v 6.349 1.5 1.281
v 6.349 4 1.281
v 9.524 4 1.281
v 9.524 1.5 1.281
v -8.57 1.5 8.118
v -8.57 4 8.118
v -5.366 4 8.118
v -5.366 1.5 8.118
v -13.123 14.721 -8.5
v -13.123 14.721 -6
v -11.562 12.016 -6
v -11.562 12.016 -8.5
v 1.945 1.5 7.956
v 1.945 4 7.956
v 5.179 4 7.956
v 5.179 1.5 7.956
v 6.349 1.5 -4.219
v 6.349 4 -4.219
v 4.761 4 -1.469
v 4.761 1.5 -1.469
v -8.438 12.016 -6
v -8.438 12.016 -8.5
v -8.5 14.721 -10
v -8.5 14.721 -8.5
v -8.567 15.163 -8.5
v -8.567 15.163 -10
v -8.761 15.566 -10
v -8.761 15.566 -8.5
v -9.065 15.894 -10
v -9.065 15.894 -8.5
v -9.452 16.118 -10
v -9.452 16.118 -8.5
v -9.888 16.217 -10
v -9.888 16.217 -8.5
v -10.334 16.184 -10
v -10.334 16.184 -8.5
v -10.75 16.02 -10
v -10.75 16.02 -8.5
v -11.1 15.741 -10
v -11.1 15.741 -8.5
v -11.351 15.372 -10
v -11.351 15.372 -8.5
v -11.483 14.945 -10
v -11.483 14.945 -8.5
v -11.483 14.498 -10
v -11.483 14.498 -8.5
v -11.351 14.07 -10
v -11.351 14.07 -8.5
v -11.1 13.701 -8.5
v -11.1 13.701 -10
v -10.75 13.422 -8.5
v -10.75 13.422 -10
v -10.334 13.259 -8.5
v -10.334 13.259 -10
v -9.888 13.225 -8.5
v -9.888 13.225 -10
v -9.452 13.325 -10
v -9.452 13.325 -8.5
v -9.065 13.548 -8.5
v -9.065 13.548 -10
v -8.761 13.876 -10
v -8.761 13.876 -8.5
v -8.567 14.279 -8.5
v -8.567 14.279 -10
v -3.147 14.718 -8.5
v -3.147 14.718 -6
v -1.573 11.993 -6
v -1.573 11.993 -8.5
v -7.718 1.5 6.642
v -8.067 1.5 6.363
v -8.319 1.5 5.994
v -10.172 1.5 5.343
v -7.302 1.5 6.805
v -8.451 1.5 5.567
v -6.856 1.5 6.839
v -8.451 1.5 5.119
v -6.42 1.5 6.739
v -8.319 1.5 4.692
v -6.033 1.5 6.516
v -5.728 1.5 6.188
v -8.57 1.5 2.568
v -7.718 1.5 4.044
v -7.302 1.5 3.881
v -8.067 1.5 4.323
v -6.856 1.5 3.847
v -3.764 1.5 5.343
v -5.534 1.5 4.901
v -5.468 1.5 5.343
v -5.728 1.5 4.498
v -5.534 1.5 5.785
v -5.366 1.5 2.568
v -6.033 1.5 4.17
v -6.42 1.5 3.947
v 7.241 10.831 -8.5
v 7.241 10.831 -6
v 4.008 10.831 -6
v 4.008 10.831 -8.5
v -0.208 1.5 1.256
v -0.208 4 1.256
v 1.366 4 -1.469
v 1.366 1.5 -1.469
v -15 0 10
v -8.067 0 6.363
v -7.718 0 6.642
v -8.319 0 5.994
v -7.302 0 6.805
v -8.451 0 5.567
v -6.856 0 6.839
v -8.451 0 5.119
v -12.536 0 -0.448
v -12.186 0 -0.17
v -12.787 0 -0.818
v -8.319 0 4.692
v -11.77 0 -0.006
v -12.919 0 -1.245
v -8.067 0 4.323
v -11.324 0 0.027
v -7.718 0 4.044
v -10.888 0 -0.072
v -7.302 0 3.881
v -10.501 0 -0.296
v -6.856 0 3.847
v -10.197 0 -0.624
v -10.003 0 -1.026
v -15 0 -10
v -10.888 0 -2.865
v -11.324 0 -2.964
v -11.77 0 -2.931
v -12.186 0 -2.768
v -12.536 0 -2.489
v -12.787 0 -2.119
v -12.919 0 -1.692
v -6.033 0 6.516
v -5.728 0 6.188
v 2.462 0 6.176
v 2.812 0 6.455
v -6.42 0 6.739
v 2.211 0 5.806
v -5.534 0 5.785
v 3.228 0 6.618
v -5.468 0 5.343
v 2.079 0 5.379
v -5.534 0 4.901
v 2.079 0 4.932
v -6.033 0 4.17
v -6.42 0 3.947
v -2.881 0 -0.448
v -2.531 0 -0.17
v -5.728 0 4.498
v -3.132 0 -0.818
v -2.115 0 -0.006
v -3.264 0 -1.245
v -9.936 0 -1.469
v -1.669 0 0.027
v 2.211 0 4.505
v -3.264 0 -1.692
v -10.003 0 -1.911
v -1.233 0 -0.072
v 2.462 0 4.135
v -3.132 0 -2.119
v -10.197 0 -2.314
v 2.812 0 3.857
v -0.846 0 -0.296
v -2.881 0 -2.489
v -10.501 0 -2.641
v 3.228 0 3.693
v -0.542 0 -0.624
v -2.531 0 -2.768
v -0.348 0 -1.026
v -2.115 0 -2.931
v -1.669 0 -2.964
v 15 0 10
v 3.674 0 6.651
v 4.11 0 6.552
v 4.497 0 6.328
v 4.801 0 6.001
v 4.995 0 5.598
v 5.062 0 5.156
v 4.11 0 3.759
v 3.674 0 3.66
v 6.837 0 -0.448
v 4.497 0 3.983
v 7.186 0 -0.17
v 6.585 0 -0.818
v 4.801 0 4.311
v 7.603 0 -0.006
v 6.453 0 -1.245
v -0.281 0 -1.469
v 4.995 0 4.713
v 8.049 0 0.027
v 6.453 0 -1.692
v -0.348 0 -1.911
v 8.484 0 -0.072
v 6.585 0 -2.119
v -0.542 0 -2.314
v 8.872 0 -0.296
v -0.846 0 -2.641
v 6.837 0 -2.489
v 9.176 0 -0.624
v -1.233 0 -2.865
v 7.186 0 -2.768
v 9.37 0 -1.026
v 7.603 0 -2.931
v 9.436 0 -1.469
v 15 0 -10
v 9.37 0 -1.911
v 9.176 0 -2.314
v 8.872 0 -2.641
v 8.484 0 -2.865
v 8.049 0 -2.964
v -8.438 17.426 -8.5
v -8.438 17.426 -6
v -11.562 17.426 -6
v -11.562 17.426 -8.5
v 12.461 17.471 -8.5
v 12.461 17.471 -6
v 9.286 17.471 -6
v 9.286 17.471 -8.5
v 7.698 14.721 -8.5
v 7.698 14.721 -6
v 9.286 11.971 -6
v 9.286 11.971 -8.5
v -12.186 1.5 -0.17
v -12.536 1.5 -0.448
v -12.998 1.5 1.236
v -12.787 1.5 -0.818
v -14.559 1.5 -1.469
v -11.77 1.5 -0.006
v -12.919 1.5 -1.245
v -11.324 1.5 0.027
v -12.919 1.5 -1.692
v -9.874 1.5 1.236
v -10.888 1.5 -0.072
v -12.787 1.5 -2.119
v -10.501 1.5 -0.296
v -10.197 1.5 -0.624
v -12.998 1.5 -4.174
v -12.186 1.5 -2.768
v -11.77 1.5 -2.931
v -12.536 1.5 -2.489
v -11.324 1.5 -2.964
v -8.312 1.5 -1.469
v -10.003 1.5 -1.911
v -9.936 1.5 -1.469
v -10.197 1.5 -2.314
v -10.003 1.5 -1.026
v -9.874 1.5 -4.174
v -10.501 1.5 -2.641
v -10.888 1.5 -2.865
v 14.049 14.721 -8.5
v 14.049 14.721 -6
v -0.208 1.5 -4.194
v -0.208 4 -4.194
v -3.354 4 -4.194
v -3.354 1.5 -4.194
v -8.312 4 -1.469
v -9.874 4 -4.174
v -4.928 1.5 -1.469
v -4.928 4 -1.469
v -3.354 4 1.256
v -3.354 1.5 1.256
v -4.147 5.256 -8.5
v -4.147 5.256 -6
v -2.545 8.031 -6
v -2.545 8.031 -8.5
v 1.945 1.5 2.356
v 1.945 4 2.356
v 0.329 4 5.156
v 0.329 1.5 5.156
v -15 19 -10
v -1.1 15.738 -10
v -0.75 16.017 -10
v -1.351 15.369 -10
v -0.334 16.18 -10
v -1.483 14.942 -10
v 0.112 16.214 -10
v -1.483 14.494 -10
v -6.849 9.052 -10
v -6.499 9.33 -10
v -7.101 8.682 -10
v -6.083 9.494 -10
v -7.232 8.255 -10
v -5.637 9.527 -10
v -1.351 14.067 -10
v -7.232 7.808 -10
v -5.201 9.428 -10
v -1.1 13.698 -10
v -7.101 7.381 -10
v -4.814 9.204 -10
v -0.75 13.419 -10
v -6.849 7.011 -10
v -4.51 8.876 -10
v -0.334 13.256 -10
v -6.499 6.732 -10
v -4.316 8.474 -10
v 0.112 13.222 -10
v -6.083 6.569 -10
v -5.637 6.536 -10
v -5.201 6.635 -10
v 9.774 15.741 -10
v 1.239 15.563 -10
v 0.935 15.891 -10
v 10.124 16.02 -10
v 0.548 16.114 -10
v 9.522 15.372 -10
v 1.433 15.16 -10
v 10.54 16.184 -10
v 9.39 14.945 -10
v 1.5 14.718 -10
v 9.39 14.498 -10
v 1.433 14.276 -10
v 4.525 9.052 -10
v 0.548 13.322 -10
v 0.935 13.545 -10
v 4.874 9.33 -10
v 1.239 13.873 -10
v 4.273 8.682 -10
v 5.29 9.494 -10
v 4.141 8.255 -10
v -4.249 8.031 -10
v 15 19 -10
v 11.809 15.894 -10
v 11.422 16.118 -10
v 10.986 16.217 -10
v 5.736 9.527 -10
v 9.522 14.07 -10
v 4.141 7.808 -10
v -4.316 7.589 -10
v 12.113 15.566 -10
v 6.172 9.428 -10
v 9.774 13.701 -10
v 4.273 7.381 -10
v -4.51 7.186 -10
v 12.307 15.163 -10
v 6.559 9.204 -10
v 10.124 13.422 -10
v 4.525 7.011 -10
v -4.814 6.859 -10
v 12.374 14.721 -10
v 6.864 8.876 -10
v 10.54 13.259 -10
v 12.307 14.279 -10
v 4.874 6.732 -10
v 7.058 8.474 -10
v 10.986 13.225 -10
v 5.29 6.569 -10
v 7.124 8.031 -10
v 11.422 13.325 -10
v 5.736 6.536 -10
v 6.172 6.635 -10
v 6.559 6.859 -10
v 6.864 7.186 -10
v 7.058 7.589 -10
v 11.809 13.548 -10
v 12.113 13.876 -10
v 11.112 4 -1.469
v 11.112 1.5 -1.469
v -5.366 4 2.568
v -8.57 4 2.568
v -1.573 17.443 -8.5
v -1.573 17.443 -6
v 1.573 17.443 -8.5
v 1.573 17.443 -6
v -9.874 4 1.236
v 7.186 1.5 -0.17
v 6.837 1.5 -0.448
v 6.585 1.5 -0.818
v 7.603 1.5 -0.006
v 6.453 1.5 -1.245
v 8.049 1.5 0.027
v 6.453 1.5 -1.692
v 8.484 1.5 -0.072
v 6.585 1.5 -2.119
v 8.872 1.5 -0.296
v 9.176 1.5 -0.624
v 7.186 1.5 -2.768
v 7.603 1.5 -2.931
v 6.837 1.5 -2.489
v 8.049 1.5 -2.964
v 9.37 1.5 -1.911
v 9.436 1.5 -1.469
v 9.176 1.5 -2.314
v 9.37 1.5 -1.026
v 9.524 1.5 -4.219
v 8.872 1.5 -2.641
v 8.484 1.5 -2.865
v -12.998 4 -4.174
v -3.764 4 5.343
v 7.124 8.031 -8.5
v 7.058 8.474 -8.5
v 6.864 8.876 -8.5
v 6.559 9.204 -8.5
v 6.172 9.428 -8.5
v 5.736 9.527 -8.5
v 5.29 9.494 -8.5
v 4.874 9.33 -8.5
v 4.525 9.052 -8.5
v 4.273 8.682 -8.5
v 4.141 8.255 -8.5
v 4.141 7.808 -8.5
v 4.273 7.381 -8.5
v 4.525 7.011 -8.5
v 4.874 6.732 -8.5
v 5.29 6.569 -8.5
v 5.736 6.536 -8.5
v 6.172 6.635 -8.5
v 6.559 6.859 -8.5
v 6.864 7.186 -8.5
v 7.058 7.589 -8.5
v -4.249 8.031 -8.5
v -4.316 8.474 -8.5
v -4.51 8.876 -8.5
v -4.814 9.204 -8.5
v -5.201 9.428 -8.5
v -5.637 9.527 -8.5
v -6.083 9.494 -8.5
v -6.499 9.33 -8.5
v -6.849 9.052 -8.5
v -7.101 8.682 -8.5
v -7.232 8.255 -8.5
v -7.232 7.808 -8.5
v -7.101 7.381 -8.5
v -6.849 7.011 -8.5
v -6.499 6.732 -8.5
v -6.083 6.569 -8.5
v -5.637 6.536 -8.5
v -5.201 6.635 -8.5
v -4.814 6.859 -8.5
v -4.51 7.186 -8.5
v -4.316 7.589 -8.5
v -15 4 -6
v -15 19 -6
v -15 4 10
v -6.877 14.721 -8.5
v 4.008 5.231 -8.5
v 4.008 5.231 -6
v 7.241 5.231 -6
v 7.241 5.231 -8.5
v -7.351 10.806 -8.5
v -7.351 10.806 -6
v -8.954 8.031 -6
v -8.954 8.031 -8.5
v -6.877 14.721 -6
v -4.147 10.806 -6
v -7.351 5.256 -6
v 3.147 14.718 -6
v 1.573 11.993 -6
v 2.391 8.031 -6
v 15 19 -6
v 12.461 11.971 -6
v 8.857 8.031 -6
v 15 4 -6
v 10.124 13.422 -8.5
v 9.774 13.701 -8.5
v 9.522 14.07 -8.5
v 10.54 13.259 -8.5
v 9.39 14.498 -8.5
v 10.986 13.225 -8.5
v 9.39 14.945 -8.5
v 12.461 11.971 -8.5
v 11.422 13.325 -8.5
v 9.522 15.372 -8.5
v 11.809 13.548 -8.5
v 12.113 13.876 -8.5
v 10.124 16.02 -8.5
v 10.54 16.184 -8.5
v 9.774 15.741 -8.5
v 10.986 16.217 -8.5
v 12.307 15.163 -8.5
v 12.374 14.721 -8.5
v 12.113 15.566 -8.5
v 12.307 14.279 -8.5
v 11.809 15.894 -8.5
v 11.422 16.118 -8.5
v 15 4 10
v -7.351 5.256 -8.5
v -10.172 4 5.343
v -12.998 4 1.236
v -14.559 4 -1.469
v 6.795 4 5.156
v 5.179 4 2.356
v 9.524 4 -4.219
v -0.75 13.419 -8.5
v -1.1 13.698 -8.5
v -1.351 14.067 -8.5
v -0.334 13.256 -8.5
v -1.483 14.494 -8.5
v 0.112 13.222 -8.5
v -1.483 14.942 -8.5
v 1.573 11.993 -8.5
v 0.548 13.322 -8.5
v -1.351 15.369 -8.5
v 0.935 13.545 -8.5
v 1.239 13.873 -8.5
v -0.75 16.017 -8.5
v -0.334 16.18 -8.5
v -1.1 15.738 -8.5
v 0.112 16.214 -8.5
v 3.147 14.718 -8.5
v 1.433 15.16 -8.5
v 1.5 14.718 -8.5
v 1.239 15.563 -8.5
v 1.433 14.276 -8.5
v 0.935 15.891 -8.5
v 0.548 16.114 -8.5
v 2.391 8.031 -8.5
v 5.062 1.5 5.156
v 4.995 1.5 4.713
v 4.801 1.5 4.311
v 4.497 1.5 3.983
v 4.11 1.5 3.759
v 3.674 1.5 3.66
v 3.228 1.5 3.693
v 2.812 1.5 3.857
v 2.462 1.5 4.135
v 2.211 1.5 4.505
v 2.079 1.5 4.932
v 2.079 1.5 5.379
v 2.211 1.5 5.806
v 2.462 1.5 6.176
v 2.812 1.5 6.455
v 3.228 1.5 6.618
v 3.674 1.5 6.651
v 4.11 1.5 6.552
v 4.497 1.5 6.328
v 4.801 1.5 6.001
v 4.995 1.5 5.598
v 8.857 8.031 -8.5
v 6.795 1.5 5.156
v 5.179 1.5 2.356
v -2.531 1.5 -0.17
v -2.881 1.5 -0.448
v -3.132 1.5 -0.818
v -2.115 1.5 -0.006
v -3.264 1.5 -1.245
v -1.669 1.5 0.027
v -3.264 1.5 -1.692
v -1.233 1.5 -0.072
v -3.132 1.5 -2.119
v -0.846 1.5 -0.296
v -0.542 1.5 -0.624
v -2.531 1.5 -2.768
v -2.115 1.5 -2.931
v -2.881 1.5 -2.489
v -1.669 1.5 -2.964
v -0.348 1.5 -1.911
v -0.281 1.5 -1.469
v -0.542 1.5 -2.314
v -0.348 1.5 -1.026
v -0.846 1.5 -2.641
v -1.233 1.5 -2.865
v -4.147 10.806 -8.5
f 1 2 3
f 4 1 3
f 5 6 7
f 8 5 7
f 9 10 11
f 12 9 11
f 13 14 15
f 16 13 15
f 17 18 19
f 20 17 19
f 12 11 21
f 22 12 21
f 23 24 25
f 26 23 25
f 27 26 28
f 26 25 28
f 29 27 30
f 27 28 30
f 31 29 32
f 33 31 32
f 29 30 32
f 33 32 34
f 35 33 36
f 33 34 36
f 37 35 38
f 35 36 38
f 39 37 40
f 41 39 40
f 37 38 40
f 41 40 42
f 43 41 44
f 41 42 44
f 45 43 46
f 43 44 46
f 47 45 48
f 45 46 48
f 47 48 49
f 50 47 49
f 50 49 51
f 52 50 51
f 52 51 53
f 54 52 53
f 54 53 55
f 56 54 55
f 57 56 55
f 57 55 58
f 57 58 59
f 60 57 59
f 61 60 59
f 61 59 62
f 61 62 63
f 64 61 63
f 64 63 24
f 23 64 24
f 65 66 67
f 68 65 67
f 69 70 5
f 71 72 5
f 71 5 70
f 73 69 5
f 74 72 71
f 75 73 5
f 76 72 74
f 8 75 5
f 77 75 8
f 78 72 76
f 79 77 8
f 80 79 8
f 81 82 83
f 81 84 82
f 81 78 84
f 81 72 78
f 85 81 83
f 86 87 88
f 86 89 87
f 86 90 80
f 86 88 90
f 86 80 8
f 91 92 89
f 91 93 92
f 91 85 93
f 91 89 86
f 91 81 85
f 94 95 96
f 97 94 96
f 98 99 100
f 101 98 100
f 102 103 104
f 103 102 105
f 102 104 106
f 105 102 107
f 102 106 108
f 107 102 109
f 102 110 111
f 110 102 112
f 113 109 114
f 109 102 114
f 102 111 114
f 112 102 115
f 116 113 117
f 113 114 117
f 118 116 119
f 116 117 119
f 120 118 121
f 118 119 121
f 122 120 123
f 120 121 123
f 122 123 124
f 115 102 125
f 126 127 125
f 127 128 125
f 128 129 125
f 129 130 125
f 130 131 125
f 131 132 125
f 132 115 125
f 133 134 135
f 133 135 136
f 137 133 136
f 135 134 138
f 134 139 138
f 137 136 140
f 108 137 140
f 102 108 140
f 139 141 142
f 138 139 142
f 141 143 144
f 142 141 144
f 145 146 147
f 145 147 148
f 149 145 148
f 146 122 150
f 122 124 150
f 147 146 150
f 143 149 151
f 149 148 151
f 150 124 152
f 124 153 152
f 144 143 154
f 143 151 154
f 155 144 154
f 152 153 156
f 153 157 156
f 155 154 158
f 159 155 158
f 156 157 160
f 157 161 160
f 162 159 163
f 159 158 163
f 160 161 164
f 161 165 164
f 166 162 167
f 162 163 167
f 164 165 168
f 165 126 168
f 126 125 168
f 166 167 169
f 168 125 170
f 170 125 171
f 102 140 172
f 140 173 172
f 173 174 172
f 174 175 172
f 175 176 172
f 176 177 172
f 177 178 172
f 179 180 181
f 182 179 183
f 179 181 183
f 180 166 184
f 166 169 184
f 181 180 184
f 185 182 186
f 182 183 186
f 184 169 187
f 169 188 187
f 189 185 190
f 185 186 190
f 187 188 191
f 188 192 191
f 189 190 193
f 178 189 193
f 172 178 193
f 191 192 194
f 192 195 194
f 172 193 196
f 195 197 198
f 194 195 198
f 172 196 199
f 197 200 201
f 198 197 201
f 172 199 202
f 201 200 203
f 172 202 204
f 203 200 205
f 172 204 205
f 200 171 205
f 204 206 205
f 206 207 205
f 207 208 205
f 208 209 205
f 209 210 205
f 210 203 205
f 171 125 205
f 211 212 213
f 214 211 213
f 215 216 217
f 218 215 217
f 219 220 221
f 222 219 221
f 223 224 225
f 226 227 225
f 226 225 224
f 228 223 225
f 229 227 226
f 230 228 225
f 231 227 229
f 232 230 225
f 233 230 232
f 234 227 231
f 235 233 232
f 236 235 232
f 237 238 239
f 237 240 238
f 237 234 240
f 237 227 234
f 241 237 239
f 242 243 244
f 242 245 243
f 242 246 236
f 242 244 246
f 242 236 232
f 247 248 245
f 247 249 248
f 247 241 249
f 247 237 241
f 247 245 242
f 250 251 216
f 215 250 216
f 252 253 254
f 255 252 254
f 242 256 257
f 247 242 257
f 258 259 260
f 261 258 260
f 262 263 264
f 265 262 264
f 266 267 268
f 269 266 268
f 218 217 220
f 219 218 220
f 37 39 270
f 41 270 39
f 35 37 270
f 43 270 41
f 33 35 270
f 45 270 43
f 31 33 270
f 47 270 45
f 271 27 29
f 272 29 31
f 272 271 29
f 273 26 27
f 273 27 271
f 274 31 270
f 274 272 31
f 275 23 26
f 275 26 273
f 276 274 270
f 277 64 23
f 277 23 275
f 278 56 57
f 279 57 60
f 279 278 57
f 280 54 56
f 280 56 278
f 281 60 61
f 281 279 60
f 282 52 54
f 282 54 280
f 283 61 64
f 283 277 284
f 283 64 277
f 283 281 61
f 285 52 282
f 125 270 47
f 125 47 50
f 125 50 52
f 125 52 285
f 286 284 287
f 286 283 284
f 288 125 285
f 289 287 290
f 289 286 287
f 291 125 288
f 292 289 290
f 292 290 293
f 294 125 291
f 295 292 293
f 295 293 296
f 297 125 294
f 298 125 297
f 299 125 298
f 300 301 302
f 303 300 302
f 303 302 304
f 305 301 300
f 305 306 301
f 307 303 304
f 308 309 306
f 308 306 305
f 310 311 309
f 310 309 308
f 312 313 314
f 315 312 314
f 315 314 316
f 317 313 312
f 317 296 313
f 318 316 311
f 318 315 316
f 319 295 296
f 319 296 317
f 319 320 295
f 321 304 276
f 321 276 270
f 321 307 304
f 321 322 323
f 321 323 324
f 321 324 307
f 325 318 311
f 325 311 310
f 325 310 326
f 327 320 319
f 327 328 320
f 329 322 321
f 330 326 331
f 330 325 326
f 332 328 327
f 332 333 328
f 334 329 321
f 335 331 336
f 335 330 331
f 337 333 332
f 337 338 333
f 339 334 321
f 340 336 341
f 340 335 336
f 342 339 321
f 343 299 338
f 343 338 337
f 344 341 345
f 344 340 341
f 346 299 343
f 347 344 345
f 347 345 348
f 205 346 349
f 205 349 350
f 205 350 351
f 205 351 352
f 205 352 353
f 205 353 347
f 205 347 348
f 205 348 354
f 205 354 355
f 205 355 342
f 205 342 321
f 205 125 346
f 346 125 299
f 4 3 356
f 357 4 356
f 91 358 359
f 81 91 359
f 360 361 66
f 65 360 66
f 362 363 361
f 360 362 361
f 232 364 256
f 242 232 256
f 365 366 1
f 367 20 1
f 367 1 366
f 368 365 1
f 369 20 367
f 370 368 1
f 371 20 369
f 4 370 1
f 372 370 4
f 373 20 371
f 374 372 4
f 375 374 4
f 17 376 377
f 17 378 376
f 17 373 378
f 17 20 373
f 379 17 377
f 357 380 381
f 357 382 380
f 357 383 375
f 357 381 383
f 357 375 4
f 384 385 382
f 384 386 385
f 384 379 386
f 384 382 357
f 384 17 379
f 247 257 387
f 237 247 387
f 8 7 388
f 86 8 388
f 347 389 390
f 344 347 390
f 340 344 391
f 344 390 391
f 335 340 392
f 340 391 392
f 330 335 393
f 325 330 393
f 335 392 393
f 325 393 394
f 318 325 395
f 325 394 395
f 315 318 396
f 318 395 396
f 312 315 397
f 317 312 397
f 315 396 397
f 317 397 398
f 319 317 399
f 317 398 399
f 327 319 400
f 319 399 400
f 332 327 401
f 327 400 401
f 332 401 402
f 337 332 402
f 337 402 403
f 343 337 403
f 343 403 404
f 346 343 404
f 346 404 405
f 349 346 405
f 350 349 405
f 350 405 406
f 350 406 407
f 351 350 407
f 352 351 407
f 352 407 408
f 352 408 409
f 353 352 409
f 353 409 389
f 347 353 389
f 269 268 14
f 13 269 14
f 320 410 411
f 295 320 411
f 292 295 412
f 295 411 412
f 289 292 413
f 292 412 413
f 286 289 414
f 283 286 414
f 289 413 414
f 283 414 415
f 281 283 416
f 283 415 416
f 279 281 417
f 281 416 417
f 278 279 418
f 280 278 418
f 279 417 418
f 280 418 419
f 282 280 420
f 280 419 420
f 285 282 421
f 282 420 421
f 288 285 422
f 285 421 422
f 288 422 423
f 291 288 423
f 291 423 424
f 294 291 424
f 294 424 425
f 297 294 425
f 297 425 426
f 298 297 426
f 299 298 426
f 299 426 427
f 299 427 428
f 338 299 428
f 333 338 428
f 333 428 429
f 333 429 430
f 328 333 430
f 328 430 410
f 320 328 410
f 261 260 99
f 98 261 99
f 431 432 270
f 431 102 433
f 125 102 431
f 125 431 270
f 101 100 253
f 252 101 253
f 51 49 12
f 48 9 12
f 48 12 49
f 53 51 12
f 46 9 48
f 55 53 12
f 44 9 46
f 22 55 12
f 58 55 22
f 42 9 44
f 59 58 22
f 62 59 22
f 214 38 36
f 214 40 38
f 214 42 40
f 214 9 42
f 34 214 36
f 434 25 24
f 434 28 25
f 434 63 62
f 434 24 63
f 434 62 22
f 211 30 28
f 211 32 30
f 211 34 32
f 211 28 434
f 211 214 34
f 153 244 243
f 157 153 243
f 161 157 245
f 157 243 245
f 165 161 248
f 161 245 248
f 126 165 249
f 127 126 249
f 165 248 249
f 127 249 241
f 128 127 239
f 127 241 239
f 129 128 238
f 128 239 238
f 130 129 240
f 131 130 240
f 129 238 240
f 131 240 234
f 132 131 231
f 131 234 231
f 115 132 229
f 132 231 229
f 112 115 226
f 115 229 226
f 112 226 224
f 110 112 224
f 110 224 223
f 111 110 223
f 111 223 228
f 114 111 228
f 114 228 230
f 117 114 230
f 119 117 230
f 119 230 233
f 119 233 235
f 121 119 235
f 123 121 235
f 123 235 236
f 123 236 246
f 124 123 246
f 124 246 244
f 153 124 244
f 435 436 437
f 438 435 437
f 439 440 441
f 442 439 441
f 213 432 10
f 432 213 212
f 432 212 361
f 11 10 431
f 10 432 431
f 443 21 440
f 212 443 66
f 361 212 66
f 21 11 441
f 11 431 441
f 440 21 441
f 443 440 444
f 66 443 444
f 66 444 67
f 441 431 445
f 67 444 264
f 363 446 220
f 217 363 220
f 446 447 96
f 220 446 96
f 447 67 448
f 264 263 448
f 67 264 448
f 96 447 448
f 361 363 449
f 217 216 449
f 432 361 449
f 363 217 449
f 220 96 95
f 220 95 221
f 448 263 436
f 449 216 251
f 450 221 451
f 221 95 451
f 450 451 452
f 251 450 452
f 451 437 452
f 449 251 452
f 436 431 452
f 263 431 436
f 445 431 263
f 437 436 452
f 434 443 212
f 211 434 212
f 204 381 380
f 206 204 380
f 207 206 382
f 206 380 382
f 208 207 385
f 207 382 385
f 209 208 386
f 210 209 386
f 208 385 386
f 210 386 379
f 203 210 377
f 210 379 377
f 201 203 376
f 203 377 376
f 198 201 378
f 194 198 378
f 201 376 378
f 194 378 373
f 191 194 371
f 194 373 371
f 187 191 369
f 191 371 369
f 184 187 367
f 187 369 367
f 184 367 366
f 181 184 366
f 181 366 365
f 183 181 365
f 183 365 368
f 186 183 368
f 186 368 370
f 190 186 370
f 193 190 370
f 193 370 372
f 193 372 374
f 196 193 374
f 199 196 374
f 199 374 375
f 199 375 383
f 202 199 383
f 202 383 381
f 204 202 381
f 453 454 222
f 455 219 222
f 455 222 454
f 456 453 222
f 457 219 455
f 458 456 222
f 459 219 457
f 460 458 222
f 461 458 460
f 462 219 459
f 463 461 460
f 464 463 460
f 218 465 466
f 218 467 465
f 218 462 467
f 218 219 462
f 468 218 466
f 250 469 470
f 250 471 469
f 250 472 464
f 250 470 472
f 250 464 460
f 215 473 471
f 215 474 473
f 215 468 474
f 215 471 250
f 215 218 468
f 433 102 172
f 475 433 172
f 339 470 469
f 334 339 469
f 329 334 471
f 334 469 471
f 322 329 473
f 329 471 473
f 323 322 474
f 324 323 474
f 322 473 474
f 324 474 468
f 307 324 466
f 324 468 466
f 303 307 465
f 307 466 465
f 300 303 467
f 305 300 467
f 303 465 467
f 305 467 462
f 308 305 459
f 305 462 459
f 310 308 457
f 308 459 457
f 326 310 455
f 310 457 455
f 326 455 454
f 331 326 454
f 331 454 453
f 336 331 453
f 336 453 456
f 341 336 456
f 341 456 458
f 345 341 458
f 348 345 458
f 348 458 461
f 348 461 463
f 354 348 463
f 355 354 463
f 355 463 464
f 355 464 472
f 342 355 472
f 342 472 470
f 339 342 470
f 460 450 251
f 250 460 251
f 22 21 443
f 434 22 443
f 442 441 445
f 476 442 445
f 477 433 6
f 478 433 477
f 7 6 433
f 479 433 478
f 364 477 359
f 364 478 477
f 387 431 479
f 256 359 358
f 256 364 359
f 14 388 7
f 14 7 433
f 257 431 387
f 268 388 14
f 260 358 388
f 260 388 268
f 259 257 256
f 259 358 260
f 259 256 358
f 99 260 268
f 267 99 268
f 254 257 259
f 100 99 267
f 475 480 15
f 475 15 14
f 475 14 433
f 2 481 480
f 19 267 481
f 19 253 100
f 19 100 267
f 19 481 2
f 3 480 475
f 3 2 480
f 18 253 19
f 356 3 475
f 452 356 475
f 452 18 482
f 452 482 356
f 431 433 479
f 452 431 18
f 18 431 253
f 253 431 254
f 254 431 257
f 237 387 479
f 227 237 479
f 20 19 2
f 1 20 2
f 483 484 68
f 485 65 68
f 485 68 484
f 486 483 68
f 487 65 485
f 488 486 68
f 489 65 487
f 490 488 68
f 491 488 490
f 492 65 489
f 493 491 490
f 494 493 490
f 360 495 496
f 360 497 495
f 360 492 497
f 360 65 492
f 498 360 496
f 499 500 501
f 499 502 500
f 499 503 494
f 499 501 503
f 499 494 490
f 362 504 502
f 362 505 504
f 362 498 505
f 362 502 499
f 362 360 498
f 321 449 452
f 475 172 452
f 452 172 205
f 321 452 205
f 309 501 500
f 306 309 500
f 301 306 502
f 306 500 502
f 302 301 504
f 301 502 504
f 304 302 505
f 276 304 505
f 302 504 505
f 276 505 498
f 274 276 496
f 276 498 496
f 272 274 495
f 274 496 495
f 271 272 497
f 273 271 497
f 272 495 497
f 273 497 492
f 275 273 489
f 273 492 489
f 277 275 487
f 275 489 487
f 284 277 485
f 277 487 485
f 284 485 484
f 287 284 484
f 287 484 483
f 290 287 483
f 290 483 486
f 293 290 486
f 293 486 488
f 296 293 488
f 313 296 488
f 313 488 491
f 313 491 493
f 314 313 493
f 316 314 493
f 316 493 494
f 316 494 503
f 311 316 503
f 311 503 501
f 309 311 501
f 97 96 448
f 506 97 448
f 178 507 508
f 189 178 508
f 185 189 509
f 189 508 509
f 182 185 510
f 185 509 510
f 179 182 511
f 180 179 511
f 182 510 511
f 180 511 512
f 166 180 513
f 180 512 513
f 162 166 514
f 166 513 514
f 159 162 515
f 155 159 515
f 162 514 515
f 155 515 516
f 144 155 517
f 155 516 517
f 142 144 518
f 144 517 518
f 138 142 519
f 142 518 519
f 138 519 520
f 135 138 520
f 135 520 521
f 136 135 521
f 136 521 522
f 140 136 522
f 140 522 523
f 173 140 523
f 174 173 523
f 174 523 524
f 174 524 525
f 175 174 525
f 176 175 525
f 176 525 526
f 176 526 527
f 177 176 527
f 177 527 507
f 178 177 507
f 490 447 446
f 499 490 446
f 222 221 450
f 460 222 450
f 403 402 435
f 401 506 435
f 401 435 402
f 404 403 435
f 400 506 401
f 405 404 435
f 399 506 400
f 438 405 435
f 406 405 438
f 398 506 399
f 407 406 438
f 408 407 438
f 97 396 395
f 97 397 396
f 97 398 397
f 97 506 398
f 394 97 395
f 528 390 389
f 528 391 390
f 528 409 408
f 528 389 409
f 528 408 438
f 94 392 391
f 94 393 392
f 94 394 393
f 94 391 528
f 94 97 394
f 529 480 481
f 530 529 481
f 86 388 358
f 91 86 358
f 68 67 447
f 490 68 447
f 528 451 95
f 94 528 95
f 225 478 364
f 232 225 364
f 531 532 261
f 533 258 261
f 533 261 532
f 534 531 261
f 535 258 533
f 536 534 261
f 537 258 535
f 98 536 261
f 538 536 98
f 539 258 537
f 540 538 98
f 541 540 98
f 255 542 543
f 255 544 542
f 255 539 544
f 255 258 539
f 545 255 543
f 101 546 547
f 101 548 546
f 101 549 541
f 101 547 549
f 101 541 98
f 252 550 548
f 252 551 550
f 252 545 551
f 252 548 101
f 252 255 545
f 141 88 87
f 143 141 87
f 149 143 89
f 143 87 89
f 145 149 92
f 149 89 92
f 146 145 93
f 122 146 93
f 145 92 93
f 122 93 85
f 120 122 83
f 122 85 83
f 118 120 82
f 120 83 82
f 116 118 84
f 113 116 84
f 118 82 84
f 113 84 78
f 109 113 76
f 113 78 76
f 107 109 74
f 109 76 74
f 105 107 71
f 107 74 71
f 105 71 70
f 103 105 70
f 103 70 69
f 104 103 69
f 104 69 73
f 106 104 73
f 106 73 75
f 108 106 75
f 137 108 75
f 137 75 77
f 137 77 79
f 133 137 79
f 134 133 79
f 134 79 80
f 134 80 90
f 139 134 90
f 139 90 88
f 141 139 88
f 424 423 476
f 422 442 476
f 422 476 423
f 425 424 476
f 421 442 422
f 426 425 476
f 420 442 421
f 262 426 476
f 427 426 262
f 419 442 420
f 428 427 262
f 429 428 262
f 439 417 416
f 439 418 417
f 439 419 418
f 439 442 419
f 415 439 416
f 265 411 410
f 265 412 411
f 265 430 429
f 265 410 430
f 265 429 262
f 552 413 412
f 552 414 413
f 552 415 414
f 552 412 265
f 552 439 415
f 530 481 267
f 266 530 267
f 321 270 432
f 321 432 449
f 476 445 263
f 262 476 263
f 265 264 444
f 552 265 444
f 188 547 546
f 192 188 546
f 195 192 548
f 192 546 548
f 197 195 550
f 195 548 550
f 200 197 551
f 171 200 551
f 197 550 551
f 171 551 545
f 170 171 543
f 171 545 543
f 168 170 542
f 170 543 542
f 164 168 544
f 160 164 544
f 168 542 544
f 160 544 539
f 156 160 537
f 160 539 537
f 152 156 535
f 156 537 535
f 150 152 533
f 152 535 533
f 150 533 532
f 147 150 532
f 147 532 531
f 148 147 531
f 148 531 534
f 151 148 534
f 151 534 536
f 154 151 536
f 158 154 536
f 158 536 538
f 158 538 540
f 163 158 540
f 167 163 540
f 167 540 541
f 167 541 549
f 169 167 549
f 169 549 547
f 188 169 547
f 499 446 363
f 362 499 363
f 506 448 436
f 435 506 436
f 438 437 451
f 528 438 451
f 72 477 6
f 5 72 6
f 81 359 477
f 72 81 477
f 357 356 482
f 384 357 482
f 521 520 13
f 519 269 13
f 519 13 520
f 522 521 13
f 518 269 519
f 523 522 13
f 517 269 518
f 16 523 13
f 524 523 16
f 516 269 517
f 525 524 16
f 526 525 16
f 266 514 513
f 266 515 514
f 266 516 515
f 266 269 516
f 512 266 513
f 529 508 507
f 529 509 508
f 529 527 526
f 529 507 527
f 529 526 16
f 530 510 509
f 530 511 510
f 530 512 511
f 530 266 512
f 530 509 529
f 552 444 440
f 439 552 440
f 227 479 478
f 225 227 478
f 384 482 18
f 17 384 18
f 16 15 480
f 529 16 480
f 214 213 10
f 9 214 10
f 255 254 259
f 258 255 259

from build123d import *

# Parameters (mm, degrees)
SKETCH1_W               = 30
SKETCH1_H               = 20
BOSS_EXTRUDE1_DEPTH     = 4
SKETCH2_W               = 30
SKETCH2_H               = 4
BOSS_EXTRUDE2_DEPTH     = 15
CUT_EXTRUDE1_DEPTH      = 2.5
SKETCH4_R               = 1.5
CUT_EXTRUDE2_DEPTH      = 19.5
CUT_EXTRUDE2_DEPTH_BACK = 2.5
CUT_EXTRUDE3_DEPTH      = 16
CUT_EXTRUDE3_DEPTH_BACK = 2.5
SKETCH6_R               = 1.5
CUT_EXTRUDE4_DEPTH      = 18.5
CUT_EXTRUDE4_DEPTH_BACK = 2.5


with BuildPart() as part:
    # Sketch1 → Boss-Extrude1 (new body)
    with BuildSketch(Plane(origin=(0, 0, 0), x_dir=(1, 0, 0), z_dir=(0, 1, 0))):
        Rectangle(SKETCH1_W, SKETCH1_H)
    extrude(amount=BOSS_EXTRUDE1_DEPTH)

    # Sketch2 → Boss-Extrude2 (add)
    with BuildSketch(Plane(origin=(0, 4, 0), x_dir=(1, 0, 0), z_dir=(0, 1, 0))):
        with Locations((0, 8)):
            Rectangle(SKETCH2_W, SKETCH2_H)
    extrude(amount=BOSS_EXTRUDE2_DEPTH)

    # Sketch3 → Cut-Extrude1 (cut)
    with BuildSketch(Plane.XY.offset(-6)):
        Polygon((-8.438267522, 12.016236672), (-6.876535044, 14.721236672), (-8.438267522, 17.426236672), (-11.561732478, 17.426236672), (-13.123464956, 14.721236672), (-11.561732478, 12.016236672), align=None)
        Polygon((1.573279484, 11.993045001), (3.146558967, 14.718045001), (1.573279484, 17.443045001), (-1.573279484, 17.443045001), (-3.146558967, 14.718045001), (-1.573279484, 11.993045001), align=None)
        Polygon((12.46124414, 11.971236672), (14.048957381, 14.721236672), (12.46124414, 17.471236672), (9.28581766, 17.471236672), (7.69810442, 14.721236672), (9.28581766, 11.971236672), align=None)
        Polygon((-4.147076238, 5.256448413), (-2.544929241, 8.031448413), (-4.147076238, 10.806448413), (-7.351370232, 10.806448413), (-8.953517229, 8.031448413), (-7.351370232, 5.256448413), align=None)
        Polygon((7.240820874, 5.231448413), (8.857401628, 8.031448413), (7.240820874, 10.831448413), (4.007659367, 10.831448413), (2.391078613, 8.031448413), (4.007659367, 5.231448413), align=None)
    extrude(amount=-CUT_EXTRUDE1_DEPTH, mode=Mode.SUBTRACT)

    # Sketch4 → Cut-Extrude2 (cut, two sides)
    with BuildSketch(Plane.XY.offset(-8.5)) as cut_extrude2_sk:
        with Locations((-10, 14.721236672)):
            Circle(SKETCH4_R)
        with Locations((0, 14.718045001)):
            Circle(SKETCH4_R)
        with Locations((10.8735309, 14.721236672)):
            Circle(SKETCH4_R)
        with Locations((5.624240121, 8.031448413)):
            Circle(SKETCH4_R)
        with Locations((-5.749223235, 8.031448413)):
            Circle(SKETCH4_R)
    extrude(amount=CUT_EXTRUDE2_DEPTH, mode=Mode.SUBTRACT)
    extrude(cut_extrude2_sk.sketch, amount=-CUT_EXTRUDE2_DEPTH_BACK, mode=Mode.SUBTRACT)

    # Sketch5 → Cut-Extrude3 (cut, two sides)
    with BuildSketch(Plane(origin=(0, 4, 0), x_dir=(1, 0, 0), z_dir=(0, 1, 0))) as cut_extrude3_sk:
        Polygon((-9.874222434, -1.236448413), (-8.312489956, 1.468551587), (-9.874222434, 4.173551587), (-12.99768739, 4.173551587), (-14.559419869, 1.468551587), (-12.99768739, -1.236448413), align=None)
        Polygon((-0.207729888, -1.256448413), (1.365549596, 1.468551587), (-0.207729888, 4.193551587), (-3.354288855, 4.193551587), (-4.927568339, 1.468551587), (-3.354288855, -1.256448413), align=None)
        Polygon((9.524140966, -1.281448413), (11.111854207, 1.468551587), (9.524140966, 4.218551587), (6.348714486, 4.218551587), (4.761001245, 1.468551587), (6.348714486, -1.281448413), align=None)
        Polygon((-5.365661597, -8.118028115), (-3.7635146, -5.343028115), (-5.365661597, -2.568028115), (-8.569955591, -2.568028115), (-10.172102588, -5.343028115), (-8.569955591, -8.118028115), align=None)
        Polygon((5.178599497, -7.955553444), (6.795180251, -5.155553444), (5.178599497, -2.355553444), (1.945437989, -2.355553444), (0.328857236, -5.155553444), (1.945437989, -7.955553444), align=None)
    extrude(amount=CUT_EXTRUDE3_DEPTH, mode=Mode.SUBTRACT)
    extrude(cut_extrude3_sk.sketch, amount=-CUT_EXTRUDE3_DEPTH_BACK, mode=Mode.SUBTRACT)

    # Sketch6 → Cut-Extrude4 (cut, two sides)
    with BuildSketch(Plane(origin=(0, 1.5, 0), x_dir=(1, 0, 0), z_dir=(0, 1, 0))) as cut_extrude4_sk:
        with Locations((-11.435954912, 1.468551587)):
            Circle(SKETCH6_R)
        with Locations((-1.781009372, 1.468551587)):
            Circle(SKETCH6_R)
        with Locations((7.936427726, 1.468551587)):
            Circle(SKETCH6_R)
        with Locations((3.562018743, -5.155553444)):
            Circle(SKETCH6_R)
        with Locations((-6.967808594, -5.343028115)):
            Circle(SKETCH6_R)
    extrude(amount=CUT_EXTRUDE4_DEPTH, mode=Mode.SUBTRACT)
    extrude(cut_extrude4_sk.sketch, amount=-CUT_EXTRUDE4_DEPTH_BACK, mode=Mode.SUBTRACT)


solid = part.part
